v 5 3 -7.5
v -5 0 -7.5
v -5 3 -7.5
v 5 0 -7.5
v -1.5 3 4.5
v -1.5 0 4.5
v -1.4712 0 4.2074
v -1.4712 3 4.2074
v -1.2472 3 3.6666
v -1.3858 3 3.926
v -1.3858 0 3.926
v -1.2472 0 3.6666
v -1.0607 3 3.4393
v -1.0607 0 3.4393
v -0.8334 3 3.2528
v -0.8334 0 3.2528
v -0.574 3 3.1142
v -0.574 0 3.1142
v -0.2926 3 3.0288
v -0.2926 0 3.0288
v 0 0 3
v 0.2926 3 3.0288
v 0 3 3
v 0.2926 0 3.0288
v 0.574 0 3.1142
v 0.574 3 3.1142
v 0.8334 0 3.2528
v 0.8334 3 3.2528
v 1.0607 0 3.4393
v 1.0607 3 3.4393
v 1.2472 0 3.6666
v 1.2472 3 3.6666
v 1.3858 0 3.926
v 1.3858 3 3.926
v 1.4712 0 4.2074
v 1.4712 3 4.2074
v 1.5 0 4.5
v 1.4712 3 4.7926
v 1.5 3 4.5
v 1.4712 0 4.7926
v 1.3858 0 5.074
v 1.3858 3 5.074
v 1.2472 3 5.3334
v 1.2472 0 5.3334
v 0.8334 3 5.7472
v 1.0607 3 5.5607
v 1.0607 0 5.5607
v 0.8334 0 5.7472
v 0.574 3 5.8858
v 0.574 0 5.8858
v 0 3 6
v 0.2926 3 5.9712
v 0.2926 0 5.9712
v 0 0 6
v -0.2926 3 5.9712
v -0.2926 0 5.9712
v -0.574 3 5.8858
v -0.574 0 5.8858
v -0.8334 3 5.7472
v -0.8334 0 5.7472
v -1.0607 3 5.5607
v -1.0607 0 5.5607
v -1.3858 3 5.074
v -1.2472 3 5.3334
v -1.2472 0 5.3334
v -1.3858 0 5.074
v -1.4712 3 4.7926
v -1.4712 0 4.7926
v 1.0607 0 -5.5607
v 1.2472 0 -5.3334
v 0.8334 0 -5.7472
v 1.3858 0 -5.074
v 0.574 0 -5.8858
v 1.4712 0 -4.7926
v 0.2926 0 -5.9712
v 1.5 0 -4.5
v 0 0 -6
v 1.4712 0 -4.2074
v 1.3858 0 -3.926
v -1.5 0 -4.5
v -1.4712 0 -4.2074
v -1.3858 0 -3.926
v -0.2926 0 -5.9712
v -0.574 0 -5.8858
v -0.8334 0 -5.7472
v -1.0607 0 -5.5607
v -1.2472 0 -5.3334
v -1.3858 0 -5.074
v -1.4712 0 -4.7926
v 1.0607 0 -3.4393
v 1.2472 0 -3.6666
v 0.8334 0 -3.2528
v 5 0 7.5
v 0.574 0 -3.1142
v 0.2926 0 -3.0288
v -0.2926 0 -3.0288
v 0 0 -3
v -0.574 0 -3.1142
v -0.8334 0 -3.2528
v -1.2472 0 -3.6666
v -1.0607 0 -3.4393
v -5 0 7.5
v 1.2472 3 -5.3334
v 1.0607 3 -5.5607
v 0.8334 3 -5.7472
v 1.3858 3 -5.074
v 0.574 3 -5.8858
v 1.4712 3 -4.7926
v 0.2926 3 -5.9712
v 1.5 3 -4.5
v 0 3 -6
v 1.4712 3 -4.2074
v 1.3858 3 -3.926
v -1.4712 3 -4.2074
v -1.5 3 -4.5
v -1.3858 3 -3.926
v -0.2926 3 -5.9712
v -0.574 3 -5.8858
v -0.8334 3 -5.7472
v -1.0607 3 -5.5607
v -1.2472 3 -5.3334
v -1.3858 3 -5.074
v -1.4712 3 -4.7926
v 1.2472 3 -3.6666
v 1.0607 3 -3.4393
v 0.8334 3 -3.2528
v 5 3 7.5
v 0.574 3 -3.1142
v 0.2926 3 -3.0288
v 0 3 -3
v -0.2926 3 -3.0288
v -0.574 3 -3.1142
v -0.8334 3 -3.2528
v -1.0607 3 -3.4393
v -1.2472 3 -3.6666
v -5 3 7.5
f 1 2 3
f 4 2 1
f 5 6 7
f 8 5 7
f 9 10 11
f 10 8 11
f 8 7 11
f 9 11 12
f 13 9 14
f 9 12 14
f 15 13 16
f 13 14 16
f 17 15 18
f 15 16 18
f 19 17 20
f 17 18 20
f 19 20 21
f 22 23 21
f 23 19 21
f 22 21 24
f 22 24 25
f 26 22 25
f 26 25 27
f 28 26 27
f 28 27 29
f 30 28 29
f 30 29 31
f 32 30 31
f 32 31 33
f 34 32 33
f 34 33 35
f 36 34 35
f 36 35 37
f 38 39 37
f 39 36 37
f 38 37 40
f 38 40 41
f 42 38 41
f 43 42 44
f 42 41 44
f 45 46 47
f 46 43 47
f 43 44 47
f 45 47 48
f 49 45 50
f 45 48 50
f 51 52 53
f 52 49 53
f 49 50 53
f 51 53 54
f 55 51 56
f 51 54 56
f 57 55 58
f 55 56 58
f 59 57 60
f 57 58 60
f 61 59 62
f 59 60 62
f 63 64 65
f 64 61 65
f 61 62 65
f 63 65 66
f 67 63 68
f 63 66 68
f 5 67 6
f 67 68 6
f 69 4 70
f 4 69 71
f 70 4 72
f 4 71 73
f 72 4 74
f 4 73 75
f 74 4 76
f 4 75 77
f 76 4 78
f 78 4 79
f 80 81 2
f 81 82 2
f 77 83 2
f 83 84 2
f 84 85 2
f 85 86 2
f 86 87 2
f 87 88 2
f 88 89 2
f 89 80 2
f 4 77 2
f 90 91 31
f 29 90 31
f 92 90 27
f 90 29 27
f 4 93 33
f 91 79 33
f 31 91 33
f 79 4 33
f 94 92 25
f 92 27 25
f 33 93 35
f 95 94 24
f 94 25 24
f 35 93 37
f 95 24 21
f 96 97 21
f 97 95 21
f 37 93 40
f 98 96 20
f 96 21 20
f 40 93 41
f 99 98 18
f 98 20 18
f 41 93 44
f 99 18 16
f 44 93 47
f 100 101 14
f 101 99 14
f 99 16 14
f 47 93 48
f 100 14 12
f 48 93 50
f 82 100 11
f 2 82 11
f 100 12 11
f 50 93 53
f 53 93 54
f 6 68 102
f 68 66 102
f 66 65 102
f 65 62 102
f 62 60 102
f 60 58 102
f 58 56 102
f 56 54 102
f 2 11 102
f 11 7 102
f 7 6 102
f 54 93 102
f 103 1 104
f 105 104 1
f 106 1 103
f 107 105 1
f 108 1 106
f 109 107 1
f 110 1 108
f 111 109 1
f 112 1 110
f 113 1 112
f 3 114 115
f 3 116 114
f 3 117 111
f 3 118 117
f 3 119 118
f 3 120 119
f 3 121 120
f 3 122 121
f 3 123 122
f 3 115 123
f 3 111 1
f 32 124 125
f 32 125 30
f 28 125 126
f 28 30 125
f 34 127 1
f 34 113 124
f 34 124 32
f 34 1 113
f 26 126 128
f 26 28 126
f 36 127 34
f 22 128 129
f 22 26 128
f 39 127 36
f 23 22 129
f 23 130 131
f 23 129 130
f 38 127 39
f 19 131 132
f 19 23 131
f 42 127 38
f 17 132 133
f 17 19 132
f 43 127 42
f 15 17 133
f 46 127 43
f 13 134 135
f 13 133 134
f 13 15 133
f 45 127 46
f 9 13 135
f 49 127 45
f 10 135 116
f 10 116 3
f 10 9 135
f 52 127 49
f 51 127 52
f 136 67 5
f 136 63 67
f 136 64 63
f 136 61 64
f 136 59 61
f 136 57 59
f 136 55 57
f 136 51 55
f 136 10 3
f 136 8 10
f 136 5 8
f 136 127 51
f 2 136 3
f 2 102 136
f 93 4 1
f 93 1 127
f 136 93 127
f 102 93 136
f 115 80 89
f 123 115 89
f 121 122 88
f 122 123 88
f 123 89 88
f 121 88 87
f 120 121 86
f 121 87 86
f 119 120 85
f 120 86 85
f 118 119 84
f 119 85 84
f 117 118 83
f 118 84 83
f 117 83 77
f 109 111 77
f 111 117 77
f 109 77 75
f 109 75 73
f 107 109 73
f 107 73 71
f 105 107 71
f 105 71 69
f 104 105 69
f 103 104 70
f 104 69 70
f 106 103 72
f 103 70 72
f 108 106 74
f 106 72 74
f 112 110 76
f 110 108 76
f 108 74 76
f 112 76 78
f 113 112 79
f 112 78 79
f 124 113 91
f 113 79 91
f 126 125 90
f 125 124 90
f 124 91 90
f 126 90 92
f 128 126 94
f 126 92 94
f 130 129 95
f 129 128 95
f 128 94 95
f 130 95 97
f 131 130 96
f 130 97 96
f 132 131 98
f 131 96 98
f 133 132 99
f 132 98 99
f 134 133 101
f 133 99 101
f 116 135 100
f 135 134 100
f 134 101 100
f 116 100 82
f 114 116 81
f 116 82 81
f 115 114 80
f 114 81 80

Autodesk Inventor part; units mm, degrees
ref_plane "YZ Plane" through (0, 0, 0) normal (1, 0, 0) x (0, 1, 0)
ref_plane "XZ Plane" through (0, 0, 0) normal (0, 1, 0) x (-1, 0, 0)
ref_plane "XY Plane" through (0, 0, 0) normal (0, 0, 1) x (1, 0, 0)
sketch "Sketch1" plane through (0, 0, 0) normal (0, 1, 0) x (-1, 0, 0)
  line L0 (5, -7.5) -> (-5, -7.5)
  line L1 (-5, -7.5) -> (-5, 7.5)
  line L2 (-5, 7.5) -> (5, 7.5)
  line L3 (5, 7.5) -> (5, -7.5)
  line L4 (5, -7.5) -> (-5, 7.5) construction
  line L5 (-5, -7.5) -> (5, 7.5) construction
  circle A0 centre (0, -4.5) radius 1.5
  circle A1 centre (0, 4.5) radius 1.5
  line L6 (0, 4.5) -> (0, 7.5) construction
  line L7 (0, -7.5) -> (0, -4.5) construction
  point P0 (0, 0)
  dimension "d0" = 10
  dimension "d1" = 15
  dimension "d2" = 3
  dimension "d3" = 3
  dimension "d4" = 9
  dimension "d5" = 5
  dimension "d7" = 5
extrude "Extrusion1" add sketch "Sketch1" along normal blind 3
equation "\"d5\" = 0.5 * d0"
equation "\"d7\" = d5"
properties part number "thumper-bumper-plunger-interface"
